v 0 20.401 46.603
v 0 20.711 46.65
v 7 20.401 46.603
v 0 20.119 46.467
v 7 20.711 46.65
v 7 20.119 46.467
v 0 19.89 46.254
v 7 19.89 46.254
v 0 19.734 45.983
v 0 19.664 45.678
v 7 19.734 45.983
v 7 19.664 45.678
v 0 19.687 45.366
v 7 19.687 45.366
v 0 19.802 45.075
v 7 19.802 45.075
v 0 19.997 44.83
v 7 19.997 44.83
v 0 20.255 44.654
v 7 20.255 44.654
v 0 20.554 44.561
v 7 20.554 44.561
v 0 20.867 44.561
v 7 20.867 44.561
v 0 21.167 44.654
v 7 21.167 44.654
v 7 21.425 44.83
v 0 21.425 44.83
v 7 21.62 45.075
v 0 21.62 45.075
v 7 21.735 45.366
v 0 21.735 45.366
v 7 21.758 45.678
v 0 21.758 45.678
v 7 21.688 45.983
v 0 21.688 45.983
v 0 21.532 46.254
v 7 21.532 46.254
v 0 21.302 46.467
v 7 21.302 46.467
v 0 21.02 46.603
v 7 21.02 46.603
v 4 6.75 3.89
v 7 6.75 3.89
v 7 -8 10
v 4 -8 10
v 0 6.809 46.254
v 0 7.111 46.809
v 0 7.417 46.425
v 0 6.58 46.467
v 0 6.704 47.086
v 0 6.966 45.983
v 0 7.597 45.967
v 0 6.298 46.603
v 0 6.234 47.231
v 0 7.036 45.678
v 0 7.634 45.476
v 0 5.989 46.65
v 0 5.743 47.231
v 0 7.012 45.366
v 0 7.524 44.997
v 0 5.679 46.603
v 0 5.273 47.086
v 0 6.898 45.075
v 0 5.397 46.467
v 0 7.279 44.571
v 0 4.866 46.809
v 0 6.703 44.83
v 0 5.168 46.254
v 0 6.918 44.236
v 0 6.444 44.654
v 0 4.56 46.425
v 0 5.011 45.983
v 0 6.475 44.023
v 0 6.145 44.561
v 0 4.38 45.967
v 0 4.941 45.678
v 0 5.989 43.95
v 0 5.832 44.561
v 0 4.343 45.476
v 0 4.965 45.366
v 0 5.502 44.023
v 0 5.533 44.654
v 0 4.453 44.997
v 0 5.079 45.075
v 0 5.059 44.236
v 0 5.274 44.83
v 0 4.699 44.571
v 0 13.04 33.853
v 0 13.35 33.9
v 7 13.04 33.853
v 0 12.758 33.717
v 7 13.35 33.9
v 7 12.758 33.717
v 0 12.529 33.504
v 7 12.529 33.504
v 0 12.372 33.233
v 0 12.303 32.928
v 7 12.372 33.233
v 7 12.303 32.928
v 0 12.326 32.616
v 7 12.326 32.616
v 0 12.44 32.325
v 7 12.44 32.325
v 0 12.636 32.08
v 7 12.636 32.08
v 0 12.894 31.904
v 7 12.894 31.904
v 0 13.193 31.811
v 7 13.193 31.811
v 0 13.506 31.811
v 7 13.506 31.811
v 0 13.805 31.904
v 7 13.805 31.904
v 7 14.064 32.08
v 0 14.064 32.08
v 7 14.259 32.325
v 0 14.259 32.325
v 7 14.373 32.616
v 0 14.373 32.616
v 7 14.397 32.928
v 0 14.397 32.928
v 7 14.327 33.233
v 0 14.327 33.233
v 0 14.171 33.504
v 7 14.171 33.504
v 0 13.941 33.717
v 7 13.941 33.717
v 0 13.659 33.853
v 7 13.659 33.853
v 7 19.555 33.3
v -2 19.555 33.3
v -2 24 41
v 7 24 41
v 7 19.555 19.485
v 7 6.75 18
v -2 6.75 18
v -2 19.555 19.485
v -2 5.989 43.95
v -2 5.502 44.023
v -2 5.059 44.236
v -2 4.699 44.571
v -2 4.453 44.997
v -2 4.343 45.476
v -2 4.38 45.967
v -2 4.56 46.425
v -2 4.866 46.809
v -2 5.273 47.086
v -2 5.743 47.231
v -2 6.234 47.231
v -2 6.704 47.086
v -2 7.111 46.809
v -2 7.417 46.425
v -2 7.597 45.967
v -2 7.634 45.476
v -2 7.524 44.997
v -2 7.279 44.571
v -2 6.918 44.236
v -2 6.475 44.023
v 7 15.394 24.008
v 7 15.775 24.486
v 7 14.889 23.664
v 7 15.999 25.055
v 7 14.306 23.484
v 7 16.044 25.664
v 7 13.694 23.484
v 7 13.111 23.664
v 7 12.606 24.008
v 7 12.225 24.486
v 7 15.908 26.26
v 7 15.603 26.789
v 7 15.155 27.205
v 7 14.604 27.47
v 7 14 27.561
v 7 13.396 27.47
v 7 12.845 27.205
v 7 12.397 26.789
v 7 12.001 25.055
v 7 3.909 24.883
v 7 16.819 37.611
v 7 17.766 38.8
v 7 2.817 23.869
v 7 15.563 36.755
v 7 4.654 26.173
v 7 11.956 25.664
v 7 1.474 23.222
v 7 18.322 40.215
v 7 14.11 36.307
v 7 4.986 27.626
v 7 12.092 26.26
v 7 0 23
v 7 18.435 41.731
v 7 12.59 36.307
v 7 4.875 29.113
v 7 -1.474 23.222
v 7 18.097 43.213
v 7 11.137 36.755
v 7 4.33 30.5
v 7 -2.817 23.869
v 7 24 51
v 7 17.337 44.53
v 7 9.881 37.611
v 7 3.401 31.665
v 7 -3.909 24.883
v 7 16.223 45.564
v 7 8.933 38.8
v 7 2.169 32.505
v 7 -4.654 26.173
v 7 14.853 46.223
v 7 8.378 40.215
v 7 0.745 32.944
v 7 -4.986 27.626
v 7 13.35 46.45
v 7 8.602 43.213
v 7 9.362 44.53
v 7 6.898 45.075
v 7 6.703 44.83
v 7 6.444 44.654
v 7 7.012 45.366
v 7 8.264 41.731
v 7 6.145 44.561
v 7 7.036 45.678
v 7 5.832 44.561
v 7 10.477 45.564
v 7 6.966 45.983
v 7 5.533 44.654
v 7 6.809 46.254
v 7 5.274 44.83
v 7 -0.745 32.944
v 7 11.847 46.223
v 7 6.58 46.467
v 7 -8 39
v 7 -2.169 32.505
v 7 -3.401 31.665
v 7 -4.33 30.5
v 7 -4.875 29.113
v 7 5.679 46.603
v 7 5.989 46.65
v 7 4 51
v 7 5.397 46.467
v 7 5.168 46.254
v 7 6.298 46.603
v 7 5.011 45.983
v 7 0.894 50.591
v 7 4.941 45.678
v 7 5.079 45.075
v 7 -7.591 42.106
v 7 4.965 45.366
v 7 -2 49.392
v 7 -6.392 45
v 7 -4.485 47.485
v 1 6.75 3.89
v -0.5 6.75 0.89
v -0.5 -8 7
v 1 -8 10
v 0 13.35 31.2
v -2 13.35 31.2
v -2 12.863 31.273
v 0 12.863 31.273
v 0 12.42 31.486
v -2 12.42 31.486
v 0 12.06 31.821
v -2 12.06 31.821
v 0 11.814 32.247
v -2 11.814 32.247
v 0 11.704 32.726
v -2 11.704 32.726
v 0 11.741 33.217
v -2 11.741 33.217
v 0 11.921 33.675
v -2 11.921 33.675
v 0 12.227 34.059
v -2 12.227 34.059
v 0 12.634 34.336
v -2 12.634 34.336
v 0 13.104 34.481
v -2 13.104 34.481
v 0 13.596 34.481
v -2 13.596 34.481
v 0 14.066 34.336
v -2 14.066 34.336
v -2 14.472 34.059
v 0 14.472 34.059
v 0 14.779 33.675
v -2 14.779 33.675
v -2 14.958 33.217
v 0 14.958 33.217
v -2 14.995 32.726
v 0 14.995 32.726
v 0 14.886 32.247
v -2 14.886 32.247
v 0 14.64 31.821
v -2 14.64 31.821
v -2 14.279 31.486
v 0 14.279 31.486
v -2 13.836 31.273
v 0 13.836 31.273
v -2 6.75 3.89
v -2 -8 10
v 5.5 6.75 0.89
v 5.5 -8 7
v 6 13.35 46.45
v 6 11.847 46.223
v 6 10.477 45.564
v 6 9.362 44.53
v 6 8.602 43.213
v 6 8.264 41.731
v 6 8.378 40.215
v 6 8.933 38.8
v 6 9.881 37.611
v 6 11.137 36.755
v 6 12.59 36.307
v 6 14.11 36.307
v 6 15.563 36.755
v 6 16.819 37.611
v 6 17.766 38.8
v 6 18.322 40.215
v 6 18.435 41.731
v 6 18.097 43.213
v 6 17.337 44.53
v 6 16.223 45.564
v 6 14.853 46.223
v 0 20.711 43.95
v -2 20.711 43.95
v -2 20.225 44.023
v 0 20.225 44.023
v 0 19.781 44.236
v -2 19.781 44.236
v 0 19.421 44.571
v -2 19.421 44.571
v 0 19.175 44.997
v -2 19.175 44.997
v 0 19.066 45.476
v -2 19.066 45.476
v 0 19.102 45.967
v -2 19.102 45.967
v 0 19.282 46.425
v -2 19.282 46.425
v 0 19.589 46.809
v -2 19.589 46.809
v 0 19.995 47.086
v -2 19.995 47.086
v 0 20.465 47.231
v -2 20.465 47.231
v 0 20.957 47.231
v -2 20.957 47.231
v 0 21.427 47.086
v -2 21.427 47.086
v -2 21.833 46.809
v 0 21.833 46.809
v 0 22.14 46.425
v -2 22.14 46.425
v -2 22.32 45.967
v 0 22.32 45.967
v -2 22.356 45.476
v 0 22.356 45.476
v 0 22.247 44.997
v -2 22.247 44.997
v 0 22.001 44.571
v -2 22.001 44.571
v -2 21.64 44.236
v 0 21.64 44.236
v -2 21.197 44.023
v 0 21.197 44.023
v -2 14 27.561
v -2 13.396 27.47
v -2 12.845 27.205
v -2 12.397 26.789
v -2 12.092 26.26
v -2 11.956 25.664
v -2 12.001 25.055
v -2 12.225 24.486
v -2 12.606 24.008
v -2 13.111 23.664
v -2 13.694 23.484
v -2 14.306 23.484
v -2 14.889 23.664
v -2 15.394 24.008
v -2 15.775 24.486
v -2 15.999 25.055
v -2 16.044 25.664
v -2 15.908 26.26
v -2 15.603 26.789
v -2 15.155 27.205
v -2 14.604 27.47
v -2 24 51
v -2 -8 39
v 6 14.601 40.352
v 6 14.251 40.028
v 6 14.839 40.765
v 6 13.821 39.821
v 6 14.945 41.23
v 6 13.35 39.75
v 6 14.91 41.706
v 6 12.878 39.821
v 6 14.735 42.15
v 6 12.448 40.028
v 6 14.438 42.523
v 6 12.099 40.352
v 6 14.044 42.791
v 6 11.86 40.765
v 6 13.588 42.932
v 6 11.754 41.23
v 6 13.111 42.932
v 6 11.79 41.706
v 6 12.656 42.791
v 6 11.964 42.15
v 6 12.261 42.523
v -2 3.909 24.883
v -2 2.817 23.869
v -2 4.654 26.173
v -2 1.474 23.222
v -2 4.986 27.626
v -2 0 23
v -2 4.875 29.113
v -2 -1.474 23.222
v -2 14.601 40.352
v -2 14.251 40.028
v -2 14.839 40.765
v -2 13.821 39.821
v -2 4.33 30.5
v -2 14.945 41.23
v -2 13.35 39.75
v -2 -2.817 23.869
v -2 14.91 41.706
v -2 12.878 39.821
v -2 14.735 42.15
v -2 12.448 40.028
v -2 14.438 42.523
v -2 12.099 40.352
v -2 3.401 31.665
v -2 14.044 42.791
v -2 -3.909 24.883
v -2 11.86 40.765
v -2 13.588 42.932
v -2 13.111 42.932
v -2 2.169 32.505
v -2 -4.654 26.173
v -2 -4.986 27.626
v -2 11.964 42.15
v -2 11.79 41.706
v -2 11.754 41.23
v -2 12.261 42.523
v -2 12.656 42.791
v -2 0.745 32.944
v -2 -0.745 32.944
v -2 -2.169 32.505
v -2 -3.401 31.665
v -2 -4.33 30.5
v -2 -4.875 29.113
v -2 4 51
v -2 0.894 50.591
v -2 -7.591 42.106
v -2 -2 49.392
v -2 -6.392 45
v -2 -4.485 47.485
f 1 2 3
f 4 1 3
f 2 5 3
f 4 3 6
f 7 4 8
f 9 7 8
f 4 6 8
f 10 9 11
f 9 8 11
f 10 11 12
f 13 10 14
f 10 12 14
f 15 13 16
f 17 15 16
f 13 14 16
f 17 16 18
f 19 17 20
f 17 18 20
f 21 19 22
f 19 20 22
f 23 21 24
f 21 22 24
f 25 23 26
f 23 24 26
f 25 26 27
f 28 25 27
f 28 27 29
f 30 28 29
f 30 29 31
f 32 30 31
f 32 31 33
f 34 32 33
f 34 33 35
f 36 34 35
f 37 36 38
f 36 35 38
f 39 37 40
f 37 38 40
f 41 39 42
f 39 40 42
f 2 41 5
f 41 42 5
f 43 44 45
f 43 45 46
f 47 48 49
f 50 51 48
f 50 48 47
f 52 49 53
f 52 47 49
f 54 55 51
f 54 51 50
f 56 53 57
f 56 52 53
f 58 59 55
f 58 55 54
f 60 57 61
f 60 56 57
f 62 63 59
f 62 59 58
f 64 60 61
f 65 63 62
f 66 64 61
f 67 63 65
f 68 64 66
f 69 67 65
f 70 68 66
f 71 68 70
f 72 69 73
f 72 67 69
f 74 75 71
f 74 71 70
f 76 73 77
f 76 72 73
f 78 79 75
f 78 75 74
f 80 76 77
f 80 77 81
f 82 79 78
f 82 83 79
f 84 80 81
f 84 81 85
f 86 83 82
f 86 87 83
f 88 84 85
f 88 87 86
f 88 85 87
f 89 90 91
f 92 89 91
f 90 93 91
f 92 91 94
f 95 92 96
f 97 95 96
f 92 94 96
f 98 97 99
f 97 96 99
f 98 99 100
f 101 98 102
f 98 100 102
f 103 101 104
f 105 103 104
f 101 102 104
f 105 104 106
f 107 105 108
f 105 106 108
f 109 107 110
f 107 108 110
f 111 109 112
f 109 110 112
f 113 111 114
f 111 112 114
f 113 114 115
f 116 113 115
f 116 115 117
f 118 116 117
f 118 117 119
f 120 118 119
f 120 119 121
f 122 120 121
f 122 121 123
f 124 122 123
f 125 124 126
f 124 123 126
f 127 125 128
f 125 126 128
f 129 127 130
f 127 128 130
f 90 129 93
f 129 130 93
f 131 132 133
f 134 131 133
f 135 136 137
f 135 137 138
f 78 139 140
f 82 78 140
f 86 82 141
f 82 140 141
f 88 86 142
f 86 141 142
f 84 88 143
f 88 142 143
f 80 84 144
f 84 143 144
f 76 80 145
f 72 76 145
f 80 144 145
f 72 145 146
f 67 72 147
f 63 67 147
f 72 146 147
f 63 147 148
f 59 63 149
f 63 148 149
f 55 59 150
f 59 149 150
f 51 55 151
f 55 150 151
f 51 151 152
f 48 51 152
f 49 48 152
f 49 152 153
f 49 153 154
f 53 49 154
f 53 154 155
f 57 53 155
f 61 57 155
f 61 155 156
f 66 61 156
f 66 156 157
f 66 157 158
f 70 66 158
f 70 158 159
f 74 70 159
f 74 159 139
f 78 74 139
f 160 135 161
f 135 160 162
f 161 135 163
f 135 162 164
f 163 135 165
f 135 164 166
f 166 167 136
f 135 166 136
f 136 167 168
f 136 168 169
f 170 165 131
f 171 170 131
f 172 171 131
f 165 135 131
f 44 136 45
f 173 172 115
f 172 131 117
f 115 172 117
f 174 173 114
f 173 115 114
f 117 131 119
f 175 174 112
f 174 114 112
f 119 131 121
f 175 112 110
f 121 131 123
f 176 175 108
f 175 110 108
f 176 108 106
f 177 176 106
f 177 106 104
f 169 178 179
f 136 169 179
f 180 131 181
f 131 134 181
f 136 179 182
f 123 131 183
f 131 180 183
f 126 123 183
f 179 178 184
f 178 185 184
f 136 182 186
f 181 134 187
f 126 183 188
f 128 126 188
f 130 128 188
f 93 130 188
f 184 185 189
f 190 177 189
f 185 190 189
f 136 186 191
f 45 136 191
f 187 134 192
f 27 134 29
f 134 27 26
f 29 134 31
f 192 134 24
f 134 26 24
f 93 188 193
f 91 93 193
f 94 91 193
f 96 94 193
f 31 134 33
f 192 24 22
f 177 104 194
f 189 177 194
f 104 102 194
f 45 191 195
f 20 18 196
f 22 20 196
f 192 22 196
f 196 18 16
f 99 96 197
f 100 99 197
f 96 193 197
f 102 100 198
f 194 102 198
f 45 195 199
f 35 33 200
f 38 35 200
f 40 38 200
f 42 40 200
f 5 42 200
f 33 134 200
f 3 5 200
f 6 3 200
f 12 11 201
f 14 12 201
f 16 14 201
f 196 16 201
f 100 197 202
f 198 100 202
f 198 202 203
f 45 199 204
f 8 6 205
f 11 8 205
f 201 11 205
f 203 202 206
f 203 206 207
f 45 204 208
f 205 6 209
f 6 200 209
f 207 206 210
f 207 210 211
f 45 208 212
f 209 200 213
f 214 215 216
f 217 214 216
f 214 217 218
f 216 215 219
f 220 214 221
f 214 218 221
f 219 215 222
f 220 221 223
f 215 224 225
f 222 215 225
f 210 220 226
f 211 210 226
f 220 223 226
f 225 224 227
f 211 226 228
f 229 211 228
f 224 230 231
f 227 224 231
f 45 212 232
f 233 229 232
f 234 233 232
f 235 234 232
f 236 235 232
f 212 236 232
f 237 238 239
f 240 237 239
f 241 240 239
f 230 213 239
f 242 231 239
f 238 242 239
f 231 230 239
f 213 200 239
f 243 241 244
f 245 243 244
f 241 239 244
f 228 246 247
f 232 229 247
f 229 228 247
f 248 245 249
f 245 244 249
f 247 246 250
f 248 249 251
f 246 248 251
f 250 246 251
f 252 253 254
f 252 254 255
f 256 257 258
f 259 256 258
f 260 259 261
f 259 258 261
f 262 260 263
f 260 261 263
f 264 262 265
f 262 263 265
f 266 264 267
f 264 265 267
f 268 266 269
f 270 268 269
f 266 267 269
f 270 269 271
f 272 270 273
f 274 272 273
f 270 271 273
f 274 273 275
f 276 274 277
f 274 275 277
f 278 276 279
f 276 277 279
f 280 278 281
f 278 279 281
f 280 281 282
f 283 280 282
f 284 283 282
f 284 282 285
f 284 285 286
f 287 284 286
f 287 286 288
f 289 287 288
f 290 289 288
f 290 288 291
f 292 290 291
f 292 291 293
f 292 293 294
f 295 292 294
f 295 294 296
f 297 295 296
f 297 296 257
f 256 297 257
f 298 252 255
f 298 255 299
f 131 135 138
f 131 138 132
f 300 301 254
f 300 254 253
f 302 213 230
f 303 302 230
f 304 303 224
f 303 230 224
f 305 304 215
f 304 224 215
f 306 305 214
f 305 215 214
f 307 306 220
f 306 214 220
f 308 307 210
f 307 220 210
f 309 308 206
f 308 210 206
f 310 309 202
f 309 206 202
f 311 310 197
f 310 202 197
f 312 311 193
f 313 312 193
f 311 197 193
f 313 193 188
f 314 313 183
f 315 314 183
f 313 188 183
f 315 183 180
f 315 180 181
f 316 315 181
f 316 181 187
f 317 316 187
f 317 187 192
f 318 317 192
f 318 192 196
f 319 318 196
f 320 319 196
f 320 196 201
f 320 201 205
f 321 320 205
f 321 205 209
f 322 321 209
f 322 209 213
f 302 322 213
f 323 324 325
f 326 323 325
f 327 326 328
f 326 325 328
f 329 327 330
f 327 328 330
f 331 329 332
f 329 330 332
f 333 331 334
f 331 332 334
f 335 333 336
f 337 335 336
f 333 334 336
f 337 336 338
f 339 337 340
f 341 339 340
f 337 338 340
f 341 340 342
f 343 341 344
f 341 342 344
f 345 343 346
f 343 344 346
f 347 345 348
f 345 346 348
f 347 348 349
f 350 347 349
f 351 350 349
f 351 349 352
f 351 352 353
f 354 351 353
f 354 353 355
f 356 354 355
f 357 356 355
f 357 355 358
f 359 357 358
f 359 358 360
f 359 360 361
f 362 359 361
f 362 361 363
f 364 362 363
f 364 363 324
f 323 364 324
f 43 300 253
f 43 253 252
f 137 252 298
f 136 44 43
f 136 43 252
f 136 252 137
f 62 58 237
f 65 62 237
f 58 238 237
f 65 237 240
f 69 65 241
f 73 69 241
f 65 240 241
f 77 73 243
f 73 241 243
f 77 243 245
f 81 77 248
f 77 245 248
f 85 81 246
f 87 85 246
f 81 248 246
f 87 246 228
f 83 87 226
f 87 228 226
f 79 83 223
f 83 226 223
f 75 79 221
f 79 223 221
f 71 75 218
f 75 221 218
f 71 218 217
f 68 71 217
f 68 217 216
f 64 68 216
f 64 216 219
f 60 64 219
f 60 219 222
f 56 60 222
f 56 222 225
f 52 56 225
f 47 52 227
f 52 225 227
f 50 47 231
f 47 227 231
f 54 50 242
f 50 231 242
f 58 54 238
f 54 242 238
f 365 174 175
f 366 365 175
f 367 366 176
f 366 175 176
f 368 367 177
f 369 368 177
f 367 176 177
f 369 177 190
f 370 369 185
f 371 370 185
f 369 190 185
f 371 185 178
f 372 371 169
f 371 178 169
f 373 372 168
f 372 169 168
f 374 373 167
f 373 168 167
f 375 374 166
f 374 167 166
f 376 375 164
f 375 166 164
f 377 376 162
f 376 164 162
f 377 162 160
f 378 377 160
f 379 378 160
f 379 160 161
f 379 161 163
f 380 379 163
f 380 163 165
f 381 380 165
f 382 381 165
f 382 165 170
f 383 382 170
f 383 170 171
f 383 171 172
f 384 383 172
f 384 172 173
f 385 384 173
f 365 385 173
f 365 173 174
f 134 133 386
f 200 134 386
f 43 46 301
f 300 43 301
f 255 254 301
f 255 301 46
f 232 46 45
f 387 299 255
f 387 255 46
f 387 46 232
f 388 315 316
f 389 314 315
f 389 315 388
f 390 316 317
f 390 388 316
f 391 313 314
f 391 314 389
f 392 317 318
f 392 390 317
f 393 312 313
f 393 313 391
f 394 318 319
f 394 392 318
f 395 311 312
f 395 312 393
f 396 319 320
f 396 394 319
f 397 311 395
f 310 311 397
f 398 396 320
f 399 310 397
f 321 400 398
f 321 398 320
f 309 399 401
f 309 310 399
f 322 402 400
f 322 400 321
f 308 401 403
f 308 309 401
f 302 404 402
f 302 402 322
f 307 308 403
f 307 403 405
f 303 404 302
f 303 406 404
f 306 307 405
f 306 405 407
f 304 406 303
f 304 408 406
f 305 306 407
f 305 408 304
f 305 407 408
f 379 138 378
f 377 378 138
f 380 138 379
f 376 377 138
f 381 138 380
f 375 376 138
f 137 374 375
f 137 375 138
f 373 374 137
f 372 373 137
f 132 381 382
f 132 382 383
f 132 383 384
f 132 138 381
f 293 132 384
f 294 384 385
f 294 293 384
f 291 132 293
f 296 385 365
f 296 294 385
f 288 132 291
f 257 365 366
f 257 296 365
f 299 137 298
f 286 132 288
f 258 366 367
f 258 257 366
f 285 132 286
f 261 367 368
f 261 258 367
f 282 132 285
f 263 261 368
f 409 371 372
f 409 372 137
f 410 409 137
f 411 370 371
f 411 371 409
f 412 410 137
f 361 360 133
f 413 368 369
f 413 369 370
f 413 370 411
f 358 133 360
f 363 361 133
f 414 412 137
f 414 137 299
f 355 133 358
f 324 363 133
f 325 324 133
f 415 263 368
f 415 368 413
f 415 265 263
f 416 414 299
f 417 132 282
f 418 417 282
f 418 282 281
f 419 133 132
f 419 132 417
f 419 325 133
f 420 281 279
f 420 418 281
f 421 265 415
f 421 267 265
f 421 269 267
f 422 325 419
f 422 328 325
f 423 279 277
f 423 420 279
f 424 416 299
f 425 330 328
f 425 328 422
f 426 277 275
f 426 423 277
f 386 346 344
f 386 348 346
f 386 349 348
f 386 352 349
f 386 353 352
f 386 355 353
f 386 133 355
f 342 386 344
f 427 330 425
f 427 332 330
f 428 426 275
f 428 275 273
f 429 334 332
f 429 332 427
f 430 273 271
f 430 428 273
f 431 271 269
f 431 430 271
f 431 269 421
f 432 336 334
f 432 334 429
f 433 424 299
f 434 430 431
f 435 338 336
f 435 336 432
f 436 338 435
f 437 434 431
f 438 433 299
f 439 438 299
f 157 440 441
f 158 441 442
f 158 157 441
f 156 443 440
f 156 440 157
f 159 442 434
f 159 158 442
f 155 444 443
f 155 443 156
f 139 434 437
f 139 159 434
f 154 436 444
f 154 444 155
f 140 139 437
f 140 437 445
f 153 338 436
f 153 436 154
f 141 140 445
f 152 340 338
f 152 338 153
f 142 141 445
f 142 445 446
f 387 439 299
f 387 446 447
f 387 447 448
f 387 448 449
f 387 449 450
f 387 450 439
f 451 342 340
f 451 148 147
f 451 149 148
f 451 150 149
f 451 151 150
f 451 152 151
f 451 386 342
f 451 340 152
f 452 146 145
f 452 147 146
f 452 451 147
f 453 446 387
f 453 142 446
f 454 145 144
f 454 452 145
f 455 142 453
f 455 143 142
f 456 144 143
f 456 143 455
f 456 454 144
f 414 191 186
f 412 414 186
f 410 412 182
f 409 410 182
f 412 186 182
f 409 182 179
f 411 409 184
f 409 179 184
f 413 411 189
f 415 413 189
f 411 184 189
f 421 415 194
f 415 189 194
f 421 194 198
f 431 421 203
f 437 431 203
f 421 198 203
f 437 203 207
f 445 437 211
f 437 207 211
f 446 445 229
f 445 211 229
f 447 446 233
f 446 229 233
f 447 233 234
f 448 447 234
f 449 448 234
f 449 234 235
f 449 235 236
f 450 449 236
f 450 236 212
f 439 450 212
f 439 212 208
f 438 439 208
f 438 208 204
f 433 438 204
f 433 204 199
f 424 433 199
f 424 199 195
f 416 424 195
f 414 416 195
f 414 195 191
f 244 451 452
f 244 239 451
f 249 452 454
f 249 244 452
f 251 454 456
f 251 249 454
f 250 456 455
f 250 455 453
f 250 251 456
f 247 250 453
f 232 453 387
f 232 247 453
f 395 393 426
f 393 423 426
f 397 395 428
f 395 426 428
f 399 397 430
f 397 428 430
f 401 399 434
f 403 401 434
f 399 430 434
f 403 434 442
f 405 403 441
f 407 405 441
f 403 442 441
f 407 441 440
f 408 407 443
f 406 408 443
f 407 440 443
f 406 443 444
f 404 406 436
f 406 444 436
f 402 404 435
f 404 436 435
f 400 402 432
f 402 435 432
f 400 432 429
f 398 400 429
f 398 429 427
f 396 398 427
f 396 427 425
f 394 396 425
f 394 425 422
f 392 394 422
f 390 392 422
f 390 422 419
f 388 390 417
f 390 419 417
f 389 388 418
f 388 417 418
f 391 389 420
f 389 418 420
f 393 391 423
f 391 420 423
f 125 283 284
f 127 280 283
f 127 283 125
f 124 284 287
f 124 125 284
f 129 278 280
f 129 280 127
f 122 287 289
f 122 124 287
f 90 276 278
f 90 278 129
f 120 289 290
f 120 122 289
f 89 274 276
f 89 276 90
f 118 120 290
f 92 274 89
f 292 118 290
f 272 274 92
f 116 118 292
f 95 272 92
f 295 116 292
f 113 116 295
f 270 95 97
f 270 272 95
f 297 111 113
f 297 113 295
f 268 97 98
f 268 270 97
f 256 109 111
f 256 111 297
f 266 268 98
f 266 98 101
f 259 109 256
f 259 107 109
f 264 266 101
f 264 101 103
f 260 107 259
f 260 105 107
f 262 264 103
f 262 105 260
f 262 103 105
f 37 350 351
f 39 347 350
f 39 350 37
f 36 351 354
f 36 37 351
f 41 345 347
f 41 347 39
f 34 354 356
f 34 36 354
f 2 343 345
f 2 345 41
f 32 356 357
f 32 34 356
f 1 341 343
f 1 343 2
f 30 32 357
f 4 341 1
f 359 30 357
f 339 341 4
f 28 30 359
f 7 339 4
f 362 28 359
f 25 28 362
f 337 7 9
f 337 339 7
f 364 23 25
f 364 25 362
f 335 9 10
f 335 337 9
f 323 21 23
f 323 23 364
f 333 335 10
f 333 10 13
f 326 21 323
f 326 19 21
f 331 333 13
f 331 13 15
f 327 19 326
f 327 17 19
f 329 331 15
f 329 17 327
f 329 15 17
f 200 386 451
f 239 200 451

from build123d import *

# Parameters (mm, degrees)
SKETCH1_W                                        = 32
SKETCH1_H                                        = 52
BOSS_EXTRUDE1_DEPTH                              = 9
CUT_EXTRUDE2_DEPTH                               = 58.078892771
F_10_0_10_DIAMETER_HOLE1_D                       = 10
FILLET3_R                                        = 12
CUT_EXTRUDE3_DEPTH                               = 58.078892771
CUT_EXTRUDE3_DEPTH_BACK                          = 58.078892771
M4X0_7_TAPPED_HOLE2_D                            = 2.1
M4X0_7_TAPPED_HOLE2_CBORE_D                      = 3.3
M4X0_7_TAPPED_HOLE2_CBORE_DEPTH                  = 2
CBORE_FOR_M3_HEX_HEAD_MACHINE_SCREW5_D           = 3.2
CBORE_FOR_M3_HEX_HEAD_MACHINE_SCREW5_CBORE_D     = 10.2
CBORE_FOR_M3_HEX_HEAD_MACHINE_SCREW5_CBORE_DEPTH = 1
F_4_1_4_1_DIAMETER_HOLE3_D                       = 4.1
CUT_EXTRUDE4_DEPTH                               = 58.078892771
CUT_EXTRUDE4_DEPTH_BACK                          = 58.078892771


with BuildPart() as part:
    # Sketch1 → Boss-Extrude1 (new body)
    with BuildSketch(Plane(origin=(-2, 0, 0), x_dir=(0, -1, 0), z_dir=(-1, 0, 0))):
        with Locations((-8, 25)):
            Rectangle(SKETCH1_W, SKETCH1_H)
    extrude(amount=-BOSS_EXTRUDE1_DEPTH)

    # Sketch3 → Cut-Extrude2 (cut, through all)
    with BuildSketch(Plane(origin=(7, 0, 0), x_dir=(0, 0, -1), z_dir=(1, 0, 0))):
        Polygon((4, 6.75), (-18, 6.75), (-20, 24), (4, 24), align=None)
    extrude(amount=-CUT_EXTRUDE2_DEPTH, mode=Mode.SUBTRACT)

    # Ø10.0 (10) Diameter Hole1 (through all)
    with Locations(Plane.ZY.offset(2)):
        with Locations((28, 0)):
            Hole(F_10_0_10_DIAMETER_HOLE1_D / 2)

    # Fillet3
    fillet3_edges = [part.edges().sort_by_distance(p)[0] for p in [
        (2.5, -8, 51),
    ]]
    fillet(fillet3_edges, radius=FILLET3_R)

    # Cut-Sweep1: sweep along a path in Sketch22
    with BuildLine(Plane(origin=(-2, 0, 0), x_dir=(0, -1, 0), z_dir=(-1, 0, 0))) as cut_sweep1_path:
        Line((8, 11), (-6.75, 4.890349955))
    # Sketch21 → Cut-Sweep1 (sweep, cut)
    with BuildSketch(Plane.XZ.offset(8)):
        Polygon((7, 7), (5.5, 7), (4, 10), (7, 10), align=None)
        Polygon((1, 10), (-0.5, 7), (-2, 7), (-2, 10), align=None)
    sweep(path=cut_sweep1_path.line, mode=Mode.SUBTRACT)

    # Sketch23 → Cut-Extrude3 (cut, two sides: drawn at the far end of the back side and taken through both)
    with BuildSketch(Plane.ZY.offset(2).offset(-CUT_EXTRUDE3_DEPTH_BACK)):
        Polygon((-1, 6.75), (-1, -8), (7, -8), (0.890349955, 6.75), align=None)
    extrude(amount=CUT_EXTRUDE3_DEPTH + CUT_EXTRUDE3_DEPTH_BACK, mode=Mode.SUBTRACT)

    # M4x0.7 Tapped Hole2 (through all)
    with Locations(Plane(origin=(-2, 13.349760492, 32.849760492), x_dir=(0, 0, -1), z_dir=(-1, 0, 0))):
        with Locations((0, 0), (-12.75, -7.361215932), (-12.75, 7.361215932)):
            CounterBoreHole(M4X0_7_TAPPED_HOLE2_D / 2, M4X0_7_TAPPED_HOLE2_CBORE_D / 2, M4X0_7_TAPPED_HOLE2_CBORE_DEPTH)

    # CBORE for M3 Hex Head Machine Screw5 (through all)
    with Locations(Plane(origin=(7, 13.349760492, 41.349760492), x_dir=(0, 0, 1), z_dir=(1, 0, 0))):
        with Locations((0, 0)):
            CounterBoreHole(CBORE_FOR_M3_HEX_HEAD_MACHINE_SCREW5_D / 2, CBORE_FOR_M3_HEX_HEAD_MACHINE_SCREW5_CBORE_D / 2, CBORE_FOR_M3_HEX_HEAD_MACHINE_SCREW5_CBORE_DEPTH)

    # Ø4.1 (4.1) Diameter Hole3 (through all)
    with Locations(Plane(origin=(-2, 14, 25.510762466), x_dir=(0, 0, -1), z_dir=(-1, 0, 0))):
        with Locations((0, 0)):
            Hole(F_4_1_4_1_DIAMETER_HOLE3_D / 2)

    # Sketch37 → Cut-Extrude4 (cut, two sides: drawn at the far end of the back side and taken through both)
    with BuildSketch(Plane.ZY.offset(2).offset(-CUT_EXTRUDE4_DEPTH_BACK)):
        Polygon((33.300431818, 19.554652238), (41, 24), (20, 24), (19.874101839, 22.914128361), (19.484597361, 19.554652238), align=None)
    extrude(amount=CUT_EXTRUDE4_DEPTH + CUT_EXTRUDE4_DEPTH_BACK, mode=Mode.SUBTRACT)


solid = part.part
